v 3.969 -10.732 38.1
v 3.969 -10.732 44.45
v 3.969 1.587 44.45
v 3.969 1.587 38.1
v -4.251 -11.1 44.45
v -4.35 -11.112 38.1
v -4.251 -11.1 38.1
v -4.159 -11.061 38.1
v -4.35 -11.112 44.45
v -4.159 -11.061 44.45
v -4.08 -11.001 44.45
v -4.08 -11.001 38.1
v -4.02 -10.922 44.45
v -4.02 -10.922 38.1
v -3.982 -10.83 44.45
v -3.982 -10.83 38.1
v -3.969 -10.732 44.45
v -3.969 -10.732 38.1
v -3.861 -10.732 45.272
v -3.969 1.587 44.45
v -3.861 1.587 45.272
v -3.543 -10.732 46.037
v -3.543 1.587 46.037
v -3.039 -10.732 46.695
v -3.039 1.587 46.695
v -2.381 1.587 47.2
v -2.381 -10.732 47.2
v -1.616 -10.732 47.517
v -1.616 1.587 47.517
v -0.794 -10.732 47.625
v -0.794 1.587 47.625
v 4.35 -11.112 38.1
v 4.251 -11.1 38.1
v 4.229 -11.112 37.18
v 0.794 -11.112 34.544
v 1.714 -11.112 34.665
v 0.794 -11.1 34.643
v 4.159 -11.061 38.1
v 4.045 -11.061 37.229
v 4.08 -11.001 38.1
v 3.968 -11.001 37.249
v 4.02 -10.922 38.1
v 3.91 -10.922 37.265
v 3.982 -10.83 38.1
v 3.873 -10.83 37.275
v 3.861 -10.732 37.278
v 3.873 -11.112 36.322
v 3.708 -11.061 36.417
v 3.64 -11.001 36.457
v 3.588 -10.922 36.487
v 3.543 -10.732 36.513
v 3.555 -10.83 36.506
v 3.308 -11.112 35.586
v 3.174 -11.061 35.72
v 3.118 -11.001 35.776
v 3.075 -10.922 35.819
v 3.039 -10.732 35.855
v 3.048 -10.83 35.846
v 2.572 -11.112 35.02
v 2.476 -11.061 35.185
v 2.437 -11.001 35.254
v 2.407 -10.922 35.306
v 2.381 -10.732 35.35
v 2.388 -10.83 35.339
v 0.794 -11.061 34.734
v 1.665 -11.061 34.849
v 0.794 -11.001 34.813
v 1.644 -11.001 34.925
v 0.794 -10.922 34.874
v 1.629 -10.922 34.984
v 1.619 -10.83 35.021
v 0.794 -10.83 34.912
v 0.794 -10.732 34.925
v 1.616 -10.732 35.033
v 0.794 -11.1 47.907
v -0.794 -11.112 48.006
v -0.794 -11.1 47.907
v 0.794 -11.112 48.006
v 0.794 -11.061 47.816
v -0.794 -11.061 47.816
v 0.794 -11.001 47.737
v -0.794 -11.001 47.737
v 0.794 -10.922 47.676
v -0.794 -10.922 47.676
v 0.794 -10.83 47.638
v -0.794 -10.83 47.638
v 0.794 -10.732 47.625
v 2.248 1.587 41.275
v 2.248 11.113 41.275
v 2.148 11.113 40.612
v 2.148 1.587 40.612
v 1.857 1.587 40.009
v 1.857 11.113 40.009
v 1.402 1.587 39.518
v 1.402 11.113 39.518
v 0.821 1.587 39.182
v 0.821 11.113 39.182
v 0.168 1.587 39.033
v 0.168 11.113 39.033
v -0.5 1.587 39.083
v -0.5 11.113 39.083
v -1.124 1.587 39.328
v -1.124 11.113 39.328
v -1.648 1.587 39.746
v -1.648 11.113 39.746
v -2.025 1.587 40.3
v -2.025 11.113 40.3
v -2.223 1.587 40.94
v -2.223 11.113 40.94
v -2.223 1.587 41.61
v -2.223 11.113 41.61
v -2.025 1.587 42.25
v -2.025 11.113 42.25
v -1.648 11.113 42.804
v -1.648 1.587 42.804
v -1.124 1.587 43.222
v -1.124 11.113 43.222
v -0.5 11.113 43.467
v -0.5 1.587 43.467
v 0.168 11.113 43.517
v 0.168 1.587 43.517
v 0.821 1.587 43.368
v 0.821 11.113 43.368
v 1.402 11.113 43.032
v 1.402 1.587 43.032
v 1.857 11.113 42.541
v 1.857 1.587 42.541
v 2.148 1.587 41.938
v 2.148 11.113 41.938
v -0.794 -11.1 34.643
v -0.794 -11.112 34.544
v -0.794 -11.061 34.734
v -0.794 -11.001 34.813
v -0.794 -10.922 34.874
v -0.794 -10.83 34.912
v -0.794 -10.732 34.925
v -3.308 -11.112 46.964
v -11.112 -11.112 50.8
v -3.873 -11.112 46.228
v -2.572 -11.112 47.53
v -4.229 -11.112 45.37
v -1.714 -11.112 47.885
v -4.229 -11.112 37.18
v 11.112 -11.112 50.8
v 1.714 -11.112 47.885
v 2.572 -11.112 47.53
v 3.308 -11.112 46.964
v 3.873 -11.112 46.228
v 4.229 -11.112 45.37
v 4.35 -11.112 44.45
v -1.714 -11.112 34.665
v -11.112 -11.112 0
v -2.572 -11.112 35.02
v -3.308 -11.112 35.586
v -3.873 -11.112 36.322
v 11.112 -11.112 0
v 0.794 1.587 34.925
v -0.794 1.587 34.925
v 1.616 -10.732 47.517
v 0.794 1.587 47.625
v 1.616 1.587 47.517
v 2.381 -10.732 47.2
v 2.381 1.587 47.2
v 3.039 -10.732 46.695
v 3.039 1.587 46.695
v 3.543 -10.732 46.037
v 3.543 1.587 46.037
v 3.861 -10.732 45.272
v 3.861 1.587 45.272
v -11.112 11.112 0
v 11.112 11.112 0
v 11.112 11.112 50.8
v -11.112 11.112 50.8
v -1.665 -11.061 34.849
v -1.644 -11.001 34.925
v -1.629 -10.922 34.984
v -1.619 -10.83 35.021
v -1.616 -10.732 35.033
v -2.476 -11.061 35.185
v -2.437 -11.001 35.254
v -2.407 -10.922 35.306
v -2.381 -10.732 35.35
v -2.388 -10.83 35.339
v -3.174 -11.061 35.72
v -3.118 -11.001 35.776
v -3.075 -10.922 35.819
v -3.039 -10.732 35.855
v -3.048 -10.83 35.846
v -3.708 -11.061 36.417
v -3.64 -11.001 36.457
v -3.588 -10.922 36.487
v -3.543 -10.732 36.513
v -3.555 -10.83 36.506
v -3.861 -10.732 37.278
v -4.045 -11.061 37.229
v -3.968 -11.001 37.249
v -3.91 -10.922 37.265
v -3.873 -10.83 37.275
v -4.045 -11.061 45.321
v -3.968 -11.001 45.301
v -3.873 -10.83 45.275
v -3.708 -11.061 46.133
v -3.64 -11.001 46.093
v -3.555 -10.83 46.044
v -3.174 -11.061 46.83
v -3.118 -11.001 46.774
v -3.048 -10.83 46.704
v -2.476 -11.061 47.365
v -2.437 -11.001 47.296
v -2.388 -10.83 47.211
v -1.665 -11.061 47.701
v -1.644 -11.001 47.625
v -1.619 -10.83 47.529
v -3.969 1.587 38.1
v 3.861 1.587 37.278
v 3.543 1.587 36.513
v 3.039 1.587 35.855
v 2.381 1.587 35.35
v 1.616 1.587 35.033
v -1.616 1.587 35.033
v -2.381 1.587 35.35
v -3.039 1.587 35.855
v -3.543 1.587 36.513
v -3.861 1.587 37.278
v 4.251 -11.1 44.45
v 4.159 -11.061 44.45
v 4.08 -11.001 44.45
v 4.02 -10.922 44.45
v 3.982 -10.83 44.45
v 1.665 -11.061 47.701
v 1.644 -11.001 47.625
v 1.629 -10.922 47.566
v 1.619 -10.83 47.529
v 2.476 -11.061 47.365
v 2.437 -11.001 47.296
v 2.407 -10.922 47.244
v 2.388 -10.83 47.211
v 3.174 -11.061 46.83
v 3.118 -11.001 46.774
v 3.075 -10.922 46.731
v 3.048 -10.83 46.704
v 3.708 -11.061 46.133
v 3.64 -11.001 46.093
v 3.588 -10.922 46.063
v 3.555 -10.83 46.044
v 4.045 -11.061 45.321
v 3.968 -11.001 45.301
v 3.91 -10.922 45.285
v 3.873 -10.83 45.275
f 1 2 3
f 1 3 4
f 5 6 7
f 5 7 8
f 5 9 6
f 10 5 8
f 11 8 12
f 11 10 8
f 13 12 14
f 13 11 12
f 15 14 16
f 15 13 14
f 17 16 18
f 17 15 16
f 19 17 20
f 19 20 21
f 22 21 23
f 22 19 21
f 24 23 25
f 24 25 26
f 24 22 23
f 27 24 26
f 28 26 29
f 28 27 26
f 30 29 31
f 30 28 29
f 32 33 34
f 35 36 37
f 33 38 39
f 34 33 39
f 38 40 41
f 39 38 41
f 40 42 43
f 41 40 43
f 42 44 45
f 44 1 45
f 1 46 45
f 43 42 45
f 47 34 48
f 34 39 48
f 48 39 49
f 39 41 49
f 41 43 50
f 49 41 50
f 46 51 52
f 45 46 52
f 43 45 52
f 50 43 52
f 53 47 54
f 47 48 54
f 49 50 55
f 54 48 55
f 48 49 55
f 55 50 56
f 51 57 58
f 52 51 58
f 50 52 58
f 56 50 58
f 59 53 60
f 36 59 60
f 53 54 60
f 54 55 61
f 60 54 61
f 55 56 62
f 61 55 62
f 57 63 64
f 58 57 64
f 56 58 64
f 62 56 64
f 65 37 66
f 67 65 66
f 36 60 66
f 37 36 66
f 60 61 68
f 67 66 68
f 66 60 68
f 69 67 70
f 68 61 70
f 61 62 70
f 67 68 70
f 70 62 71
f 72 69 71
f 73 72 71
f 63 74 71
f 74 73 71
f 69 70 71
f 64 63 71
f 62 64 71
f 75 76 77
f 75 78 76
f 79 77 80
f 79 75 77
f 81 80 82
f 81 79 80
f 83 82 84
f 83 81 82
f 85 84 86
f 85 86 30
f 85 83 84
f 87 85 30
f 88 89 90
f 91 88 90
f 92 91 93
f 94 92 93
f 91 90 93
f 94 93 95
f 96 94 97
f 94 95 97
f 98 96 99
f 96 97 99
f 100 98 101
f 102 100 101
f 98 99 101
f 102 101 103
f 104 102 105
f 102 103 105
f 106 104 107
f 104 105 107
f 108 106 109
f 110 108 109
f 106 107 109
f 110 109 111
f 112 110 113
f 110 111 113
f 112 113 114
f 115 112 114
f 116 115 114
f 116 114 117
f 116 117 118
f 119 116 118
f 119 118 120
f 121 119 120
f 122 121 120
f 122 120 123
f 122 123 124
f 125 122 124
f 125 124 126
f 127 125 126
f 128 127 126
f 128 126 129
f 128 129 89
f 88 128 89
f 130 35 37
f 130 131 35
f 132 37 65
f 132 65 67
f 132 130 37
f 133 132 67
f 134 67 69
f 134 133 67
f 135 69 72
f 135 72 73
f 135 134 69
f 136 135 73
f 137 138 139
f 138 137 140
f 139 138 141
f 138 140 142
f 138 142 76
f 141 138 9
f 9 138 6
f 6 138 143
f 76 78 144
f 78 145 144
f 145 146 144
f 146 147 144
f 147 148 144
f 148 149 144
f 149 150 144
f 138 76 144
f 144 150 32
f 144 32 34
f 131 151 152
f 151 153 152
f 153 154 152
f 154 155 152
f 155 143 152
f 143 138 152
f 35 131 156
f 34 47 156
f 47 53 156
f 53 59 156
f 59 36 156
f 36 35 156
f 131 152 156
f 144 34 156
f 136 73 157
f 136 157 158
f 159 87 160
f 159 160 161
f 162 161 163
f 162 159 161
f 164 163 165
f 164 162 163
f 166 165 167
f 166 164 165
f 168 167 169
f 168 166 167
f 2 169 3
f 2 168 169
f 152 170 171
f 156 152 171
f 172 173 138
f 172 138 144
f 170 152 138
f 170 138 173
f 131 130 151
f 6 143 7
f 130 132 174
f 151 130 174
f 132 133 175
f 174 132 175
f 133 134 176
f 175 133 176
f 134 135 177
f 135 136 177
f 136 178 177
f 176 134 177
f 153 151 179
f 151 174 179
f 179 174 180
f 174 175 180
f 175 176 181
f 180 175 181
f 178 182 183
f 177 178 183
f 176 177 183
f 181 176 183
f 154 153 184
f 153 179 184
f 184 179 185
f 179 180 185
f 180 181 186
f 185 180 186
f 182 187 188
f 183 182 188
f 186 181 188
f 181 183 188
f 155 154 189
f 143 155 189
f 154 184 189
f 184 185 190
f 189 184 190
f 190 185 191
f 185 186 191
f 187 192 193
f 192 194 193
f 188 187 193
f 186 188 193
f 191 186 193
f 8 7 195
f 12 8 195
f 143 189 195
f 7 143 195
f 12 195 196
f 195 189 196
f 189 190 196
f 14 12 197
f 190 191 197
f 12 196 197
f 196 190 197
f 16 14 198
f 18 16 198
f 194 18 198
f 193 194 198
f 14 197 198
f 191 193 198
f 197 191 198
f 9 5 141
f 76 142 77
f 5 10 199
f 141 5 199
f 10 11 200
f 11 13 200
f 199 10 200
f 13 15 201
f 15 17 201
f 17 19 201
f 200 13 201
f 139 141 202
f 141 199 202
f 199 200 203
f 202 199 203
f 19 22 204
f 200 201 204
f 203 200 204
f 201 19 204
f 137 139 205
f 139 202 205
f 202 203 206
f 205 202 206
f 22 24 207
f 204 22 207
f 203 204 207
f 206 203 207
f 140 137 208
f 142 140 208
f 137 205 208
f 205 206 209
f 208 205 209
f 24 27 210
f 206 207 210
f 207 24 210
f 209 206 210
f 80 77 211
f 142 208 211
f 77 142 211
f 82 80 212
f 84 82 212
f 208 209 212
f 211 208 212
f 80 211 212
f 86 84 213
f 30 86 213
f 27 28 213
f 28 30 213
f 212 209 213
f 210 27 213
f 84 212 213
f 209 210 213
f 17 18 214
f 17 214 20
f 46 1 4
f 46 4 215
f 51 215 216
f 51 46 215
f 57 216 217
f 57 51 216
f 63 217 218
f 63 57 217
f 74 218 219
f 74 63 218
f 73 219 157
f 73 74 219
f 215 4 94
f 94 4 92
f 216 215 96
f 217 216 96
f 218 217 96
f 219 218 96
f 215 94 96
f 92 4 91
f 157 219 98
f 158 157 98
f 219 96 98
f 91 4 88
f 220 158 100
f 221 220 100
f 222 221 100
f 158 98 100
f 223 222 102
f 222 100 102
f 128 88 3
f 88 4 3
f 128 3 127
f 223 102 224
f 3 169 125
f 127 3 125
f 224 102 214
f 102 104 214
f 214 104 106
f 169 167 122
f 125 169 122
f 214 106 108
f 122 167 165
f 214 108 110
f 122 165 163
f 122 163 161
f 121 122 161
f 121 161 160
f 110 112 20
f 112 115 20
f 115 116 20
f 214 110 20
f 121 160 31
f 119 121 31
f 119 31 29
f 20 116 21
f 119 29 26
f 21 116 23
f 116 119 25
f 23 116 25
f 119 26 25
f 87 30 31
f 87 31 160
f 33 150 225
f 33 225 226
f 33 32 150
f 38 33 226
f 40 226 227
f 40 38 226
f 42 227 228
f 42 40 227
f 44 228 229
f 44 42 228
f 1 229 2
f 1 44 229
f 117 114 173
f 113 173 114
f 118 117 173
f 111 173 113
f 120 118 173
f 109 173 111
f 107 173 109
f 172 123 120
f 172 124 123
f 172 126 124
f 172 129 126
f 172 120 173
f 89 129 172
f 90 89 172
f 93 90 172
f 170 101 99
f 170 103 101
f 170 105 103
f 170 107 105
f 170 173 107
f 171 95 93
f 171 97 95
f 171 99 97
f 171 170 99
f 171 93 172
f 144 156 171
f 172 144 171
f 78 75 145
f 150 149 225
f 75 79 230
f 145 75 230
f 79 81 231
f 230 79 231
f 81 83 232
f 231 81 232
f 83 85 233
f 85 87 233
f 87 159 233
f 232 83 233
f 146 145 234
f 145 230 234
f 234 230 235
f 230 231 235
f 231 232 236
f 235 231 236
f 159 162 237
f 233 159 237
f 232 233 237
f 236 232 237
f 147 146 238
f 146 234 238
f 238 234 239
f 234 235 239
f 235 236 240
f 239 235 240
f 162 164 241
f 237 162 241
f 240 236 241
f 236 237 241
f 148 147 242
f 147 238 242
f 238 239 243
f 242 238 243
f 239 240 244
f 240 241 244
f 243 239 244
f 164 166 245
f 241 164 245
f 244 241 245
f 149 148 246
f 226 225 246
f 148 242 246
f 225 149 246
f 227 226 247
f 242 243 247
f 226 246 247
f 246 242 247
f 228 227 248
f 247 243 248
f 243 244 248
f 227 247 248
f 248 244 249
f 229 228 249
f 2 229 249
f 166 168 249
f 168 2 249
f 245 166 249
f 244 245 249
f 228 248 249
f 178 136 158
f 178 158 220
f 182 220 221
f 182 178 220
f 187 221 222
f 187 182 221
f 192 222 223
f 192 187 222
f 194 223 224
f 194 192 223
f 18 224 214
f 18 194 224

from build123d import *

# Parameters (mm, degrees)
SKETCH1_W             = 22.225
SKETCH1_H             = 22.225
BOSS_EXTRUDE1_DEPTH   = 50.8
CUT_EXTRUDE1_DEPTH    = 12.7
F_8_CLEARANCE_HOLE1_D = 4.4958
FILLET1_R             = 0.381


with BuildPart() as part:
    # Sketch1 → Boss-Extrude1 (new body)
    with BuildSketch(Plane.XY):
        Rectangle(SKETCH1_W, SKETCH1_H)
    extrude(amount=BOSS_EXTRUDE1_DEPTH)

    # Sketch2 → Cut-Extrude1 (cut)
    with BuildSketch(Plane.XZ.offset(11.1125)):
        with BuildLine():
            Line((-0.79375, 47.625), (0.79375, 47.625))
            ThreePointArc((0.79375, 47.625), (3.03881403, 46.69506403), (3.96875, 44.45))
            Line((3.96875, 44.45), (3.96875, 38.1))
            ThreePointArc((3.96875, 38.1), (3.03881403, 35.85493597), (0.79375, 34.925))
            Line((0.79375, 34.925), (-0.79375, 34.925))
            ThreePointArc((-0.79375, 34.925), (-3.03881403, 35.85493597), (-3.96875, 38.1))
            Line((-3.96875, 38.1), (-3.96875, 44.45))
            ThreePointArc((-3.96875, 44.45), (-3.03881403, 46.69506403), (-0.79375, 47.625))
        make_face()
    extrude(amount=-CUT_EXTRUDE1_DEPTH, mode=Mode.SUBTRACT)

    # #8 Clearance Hole1 (through all)
    with Locations(Plane(origin=(0, 1.5875, 0), x_dir=(-1, 0, 0), z_dir=(0, -1, 0))):
        with Locations((0, -41.275)):
            Hole(F_8_CLEARANCE_HOLE1_D / 2)

    # Fillet1
    fillet1_edges = [part.edges().sort_by_distance(p)[0] for p in [
        (0, -11.1125, 47.625),
        (3.96875, -11.1125, 41.275),
        (-3.03881403, -11.1125, 46.69506403),
        (-3.96875, -11.1125, 41.275),
        (-3.03881403, -11.1125, 35.85493597),
        (0, -11.1125, 34.925),
        (3.03881403, -11.1125, 35.85493597),
        (3.03881403, -11.1125, 46.69506403),
    ]]
    fillet(fillet1_edges, radius=FILLET1_R)


solid = part.part
